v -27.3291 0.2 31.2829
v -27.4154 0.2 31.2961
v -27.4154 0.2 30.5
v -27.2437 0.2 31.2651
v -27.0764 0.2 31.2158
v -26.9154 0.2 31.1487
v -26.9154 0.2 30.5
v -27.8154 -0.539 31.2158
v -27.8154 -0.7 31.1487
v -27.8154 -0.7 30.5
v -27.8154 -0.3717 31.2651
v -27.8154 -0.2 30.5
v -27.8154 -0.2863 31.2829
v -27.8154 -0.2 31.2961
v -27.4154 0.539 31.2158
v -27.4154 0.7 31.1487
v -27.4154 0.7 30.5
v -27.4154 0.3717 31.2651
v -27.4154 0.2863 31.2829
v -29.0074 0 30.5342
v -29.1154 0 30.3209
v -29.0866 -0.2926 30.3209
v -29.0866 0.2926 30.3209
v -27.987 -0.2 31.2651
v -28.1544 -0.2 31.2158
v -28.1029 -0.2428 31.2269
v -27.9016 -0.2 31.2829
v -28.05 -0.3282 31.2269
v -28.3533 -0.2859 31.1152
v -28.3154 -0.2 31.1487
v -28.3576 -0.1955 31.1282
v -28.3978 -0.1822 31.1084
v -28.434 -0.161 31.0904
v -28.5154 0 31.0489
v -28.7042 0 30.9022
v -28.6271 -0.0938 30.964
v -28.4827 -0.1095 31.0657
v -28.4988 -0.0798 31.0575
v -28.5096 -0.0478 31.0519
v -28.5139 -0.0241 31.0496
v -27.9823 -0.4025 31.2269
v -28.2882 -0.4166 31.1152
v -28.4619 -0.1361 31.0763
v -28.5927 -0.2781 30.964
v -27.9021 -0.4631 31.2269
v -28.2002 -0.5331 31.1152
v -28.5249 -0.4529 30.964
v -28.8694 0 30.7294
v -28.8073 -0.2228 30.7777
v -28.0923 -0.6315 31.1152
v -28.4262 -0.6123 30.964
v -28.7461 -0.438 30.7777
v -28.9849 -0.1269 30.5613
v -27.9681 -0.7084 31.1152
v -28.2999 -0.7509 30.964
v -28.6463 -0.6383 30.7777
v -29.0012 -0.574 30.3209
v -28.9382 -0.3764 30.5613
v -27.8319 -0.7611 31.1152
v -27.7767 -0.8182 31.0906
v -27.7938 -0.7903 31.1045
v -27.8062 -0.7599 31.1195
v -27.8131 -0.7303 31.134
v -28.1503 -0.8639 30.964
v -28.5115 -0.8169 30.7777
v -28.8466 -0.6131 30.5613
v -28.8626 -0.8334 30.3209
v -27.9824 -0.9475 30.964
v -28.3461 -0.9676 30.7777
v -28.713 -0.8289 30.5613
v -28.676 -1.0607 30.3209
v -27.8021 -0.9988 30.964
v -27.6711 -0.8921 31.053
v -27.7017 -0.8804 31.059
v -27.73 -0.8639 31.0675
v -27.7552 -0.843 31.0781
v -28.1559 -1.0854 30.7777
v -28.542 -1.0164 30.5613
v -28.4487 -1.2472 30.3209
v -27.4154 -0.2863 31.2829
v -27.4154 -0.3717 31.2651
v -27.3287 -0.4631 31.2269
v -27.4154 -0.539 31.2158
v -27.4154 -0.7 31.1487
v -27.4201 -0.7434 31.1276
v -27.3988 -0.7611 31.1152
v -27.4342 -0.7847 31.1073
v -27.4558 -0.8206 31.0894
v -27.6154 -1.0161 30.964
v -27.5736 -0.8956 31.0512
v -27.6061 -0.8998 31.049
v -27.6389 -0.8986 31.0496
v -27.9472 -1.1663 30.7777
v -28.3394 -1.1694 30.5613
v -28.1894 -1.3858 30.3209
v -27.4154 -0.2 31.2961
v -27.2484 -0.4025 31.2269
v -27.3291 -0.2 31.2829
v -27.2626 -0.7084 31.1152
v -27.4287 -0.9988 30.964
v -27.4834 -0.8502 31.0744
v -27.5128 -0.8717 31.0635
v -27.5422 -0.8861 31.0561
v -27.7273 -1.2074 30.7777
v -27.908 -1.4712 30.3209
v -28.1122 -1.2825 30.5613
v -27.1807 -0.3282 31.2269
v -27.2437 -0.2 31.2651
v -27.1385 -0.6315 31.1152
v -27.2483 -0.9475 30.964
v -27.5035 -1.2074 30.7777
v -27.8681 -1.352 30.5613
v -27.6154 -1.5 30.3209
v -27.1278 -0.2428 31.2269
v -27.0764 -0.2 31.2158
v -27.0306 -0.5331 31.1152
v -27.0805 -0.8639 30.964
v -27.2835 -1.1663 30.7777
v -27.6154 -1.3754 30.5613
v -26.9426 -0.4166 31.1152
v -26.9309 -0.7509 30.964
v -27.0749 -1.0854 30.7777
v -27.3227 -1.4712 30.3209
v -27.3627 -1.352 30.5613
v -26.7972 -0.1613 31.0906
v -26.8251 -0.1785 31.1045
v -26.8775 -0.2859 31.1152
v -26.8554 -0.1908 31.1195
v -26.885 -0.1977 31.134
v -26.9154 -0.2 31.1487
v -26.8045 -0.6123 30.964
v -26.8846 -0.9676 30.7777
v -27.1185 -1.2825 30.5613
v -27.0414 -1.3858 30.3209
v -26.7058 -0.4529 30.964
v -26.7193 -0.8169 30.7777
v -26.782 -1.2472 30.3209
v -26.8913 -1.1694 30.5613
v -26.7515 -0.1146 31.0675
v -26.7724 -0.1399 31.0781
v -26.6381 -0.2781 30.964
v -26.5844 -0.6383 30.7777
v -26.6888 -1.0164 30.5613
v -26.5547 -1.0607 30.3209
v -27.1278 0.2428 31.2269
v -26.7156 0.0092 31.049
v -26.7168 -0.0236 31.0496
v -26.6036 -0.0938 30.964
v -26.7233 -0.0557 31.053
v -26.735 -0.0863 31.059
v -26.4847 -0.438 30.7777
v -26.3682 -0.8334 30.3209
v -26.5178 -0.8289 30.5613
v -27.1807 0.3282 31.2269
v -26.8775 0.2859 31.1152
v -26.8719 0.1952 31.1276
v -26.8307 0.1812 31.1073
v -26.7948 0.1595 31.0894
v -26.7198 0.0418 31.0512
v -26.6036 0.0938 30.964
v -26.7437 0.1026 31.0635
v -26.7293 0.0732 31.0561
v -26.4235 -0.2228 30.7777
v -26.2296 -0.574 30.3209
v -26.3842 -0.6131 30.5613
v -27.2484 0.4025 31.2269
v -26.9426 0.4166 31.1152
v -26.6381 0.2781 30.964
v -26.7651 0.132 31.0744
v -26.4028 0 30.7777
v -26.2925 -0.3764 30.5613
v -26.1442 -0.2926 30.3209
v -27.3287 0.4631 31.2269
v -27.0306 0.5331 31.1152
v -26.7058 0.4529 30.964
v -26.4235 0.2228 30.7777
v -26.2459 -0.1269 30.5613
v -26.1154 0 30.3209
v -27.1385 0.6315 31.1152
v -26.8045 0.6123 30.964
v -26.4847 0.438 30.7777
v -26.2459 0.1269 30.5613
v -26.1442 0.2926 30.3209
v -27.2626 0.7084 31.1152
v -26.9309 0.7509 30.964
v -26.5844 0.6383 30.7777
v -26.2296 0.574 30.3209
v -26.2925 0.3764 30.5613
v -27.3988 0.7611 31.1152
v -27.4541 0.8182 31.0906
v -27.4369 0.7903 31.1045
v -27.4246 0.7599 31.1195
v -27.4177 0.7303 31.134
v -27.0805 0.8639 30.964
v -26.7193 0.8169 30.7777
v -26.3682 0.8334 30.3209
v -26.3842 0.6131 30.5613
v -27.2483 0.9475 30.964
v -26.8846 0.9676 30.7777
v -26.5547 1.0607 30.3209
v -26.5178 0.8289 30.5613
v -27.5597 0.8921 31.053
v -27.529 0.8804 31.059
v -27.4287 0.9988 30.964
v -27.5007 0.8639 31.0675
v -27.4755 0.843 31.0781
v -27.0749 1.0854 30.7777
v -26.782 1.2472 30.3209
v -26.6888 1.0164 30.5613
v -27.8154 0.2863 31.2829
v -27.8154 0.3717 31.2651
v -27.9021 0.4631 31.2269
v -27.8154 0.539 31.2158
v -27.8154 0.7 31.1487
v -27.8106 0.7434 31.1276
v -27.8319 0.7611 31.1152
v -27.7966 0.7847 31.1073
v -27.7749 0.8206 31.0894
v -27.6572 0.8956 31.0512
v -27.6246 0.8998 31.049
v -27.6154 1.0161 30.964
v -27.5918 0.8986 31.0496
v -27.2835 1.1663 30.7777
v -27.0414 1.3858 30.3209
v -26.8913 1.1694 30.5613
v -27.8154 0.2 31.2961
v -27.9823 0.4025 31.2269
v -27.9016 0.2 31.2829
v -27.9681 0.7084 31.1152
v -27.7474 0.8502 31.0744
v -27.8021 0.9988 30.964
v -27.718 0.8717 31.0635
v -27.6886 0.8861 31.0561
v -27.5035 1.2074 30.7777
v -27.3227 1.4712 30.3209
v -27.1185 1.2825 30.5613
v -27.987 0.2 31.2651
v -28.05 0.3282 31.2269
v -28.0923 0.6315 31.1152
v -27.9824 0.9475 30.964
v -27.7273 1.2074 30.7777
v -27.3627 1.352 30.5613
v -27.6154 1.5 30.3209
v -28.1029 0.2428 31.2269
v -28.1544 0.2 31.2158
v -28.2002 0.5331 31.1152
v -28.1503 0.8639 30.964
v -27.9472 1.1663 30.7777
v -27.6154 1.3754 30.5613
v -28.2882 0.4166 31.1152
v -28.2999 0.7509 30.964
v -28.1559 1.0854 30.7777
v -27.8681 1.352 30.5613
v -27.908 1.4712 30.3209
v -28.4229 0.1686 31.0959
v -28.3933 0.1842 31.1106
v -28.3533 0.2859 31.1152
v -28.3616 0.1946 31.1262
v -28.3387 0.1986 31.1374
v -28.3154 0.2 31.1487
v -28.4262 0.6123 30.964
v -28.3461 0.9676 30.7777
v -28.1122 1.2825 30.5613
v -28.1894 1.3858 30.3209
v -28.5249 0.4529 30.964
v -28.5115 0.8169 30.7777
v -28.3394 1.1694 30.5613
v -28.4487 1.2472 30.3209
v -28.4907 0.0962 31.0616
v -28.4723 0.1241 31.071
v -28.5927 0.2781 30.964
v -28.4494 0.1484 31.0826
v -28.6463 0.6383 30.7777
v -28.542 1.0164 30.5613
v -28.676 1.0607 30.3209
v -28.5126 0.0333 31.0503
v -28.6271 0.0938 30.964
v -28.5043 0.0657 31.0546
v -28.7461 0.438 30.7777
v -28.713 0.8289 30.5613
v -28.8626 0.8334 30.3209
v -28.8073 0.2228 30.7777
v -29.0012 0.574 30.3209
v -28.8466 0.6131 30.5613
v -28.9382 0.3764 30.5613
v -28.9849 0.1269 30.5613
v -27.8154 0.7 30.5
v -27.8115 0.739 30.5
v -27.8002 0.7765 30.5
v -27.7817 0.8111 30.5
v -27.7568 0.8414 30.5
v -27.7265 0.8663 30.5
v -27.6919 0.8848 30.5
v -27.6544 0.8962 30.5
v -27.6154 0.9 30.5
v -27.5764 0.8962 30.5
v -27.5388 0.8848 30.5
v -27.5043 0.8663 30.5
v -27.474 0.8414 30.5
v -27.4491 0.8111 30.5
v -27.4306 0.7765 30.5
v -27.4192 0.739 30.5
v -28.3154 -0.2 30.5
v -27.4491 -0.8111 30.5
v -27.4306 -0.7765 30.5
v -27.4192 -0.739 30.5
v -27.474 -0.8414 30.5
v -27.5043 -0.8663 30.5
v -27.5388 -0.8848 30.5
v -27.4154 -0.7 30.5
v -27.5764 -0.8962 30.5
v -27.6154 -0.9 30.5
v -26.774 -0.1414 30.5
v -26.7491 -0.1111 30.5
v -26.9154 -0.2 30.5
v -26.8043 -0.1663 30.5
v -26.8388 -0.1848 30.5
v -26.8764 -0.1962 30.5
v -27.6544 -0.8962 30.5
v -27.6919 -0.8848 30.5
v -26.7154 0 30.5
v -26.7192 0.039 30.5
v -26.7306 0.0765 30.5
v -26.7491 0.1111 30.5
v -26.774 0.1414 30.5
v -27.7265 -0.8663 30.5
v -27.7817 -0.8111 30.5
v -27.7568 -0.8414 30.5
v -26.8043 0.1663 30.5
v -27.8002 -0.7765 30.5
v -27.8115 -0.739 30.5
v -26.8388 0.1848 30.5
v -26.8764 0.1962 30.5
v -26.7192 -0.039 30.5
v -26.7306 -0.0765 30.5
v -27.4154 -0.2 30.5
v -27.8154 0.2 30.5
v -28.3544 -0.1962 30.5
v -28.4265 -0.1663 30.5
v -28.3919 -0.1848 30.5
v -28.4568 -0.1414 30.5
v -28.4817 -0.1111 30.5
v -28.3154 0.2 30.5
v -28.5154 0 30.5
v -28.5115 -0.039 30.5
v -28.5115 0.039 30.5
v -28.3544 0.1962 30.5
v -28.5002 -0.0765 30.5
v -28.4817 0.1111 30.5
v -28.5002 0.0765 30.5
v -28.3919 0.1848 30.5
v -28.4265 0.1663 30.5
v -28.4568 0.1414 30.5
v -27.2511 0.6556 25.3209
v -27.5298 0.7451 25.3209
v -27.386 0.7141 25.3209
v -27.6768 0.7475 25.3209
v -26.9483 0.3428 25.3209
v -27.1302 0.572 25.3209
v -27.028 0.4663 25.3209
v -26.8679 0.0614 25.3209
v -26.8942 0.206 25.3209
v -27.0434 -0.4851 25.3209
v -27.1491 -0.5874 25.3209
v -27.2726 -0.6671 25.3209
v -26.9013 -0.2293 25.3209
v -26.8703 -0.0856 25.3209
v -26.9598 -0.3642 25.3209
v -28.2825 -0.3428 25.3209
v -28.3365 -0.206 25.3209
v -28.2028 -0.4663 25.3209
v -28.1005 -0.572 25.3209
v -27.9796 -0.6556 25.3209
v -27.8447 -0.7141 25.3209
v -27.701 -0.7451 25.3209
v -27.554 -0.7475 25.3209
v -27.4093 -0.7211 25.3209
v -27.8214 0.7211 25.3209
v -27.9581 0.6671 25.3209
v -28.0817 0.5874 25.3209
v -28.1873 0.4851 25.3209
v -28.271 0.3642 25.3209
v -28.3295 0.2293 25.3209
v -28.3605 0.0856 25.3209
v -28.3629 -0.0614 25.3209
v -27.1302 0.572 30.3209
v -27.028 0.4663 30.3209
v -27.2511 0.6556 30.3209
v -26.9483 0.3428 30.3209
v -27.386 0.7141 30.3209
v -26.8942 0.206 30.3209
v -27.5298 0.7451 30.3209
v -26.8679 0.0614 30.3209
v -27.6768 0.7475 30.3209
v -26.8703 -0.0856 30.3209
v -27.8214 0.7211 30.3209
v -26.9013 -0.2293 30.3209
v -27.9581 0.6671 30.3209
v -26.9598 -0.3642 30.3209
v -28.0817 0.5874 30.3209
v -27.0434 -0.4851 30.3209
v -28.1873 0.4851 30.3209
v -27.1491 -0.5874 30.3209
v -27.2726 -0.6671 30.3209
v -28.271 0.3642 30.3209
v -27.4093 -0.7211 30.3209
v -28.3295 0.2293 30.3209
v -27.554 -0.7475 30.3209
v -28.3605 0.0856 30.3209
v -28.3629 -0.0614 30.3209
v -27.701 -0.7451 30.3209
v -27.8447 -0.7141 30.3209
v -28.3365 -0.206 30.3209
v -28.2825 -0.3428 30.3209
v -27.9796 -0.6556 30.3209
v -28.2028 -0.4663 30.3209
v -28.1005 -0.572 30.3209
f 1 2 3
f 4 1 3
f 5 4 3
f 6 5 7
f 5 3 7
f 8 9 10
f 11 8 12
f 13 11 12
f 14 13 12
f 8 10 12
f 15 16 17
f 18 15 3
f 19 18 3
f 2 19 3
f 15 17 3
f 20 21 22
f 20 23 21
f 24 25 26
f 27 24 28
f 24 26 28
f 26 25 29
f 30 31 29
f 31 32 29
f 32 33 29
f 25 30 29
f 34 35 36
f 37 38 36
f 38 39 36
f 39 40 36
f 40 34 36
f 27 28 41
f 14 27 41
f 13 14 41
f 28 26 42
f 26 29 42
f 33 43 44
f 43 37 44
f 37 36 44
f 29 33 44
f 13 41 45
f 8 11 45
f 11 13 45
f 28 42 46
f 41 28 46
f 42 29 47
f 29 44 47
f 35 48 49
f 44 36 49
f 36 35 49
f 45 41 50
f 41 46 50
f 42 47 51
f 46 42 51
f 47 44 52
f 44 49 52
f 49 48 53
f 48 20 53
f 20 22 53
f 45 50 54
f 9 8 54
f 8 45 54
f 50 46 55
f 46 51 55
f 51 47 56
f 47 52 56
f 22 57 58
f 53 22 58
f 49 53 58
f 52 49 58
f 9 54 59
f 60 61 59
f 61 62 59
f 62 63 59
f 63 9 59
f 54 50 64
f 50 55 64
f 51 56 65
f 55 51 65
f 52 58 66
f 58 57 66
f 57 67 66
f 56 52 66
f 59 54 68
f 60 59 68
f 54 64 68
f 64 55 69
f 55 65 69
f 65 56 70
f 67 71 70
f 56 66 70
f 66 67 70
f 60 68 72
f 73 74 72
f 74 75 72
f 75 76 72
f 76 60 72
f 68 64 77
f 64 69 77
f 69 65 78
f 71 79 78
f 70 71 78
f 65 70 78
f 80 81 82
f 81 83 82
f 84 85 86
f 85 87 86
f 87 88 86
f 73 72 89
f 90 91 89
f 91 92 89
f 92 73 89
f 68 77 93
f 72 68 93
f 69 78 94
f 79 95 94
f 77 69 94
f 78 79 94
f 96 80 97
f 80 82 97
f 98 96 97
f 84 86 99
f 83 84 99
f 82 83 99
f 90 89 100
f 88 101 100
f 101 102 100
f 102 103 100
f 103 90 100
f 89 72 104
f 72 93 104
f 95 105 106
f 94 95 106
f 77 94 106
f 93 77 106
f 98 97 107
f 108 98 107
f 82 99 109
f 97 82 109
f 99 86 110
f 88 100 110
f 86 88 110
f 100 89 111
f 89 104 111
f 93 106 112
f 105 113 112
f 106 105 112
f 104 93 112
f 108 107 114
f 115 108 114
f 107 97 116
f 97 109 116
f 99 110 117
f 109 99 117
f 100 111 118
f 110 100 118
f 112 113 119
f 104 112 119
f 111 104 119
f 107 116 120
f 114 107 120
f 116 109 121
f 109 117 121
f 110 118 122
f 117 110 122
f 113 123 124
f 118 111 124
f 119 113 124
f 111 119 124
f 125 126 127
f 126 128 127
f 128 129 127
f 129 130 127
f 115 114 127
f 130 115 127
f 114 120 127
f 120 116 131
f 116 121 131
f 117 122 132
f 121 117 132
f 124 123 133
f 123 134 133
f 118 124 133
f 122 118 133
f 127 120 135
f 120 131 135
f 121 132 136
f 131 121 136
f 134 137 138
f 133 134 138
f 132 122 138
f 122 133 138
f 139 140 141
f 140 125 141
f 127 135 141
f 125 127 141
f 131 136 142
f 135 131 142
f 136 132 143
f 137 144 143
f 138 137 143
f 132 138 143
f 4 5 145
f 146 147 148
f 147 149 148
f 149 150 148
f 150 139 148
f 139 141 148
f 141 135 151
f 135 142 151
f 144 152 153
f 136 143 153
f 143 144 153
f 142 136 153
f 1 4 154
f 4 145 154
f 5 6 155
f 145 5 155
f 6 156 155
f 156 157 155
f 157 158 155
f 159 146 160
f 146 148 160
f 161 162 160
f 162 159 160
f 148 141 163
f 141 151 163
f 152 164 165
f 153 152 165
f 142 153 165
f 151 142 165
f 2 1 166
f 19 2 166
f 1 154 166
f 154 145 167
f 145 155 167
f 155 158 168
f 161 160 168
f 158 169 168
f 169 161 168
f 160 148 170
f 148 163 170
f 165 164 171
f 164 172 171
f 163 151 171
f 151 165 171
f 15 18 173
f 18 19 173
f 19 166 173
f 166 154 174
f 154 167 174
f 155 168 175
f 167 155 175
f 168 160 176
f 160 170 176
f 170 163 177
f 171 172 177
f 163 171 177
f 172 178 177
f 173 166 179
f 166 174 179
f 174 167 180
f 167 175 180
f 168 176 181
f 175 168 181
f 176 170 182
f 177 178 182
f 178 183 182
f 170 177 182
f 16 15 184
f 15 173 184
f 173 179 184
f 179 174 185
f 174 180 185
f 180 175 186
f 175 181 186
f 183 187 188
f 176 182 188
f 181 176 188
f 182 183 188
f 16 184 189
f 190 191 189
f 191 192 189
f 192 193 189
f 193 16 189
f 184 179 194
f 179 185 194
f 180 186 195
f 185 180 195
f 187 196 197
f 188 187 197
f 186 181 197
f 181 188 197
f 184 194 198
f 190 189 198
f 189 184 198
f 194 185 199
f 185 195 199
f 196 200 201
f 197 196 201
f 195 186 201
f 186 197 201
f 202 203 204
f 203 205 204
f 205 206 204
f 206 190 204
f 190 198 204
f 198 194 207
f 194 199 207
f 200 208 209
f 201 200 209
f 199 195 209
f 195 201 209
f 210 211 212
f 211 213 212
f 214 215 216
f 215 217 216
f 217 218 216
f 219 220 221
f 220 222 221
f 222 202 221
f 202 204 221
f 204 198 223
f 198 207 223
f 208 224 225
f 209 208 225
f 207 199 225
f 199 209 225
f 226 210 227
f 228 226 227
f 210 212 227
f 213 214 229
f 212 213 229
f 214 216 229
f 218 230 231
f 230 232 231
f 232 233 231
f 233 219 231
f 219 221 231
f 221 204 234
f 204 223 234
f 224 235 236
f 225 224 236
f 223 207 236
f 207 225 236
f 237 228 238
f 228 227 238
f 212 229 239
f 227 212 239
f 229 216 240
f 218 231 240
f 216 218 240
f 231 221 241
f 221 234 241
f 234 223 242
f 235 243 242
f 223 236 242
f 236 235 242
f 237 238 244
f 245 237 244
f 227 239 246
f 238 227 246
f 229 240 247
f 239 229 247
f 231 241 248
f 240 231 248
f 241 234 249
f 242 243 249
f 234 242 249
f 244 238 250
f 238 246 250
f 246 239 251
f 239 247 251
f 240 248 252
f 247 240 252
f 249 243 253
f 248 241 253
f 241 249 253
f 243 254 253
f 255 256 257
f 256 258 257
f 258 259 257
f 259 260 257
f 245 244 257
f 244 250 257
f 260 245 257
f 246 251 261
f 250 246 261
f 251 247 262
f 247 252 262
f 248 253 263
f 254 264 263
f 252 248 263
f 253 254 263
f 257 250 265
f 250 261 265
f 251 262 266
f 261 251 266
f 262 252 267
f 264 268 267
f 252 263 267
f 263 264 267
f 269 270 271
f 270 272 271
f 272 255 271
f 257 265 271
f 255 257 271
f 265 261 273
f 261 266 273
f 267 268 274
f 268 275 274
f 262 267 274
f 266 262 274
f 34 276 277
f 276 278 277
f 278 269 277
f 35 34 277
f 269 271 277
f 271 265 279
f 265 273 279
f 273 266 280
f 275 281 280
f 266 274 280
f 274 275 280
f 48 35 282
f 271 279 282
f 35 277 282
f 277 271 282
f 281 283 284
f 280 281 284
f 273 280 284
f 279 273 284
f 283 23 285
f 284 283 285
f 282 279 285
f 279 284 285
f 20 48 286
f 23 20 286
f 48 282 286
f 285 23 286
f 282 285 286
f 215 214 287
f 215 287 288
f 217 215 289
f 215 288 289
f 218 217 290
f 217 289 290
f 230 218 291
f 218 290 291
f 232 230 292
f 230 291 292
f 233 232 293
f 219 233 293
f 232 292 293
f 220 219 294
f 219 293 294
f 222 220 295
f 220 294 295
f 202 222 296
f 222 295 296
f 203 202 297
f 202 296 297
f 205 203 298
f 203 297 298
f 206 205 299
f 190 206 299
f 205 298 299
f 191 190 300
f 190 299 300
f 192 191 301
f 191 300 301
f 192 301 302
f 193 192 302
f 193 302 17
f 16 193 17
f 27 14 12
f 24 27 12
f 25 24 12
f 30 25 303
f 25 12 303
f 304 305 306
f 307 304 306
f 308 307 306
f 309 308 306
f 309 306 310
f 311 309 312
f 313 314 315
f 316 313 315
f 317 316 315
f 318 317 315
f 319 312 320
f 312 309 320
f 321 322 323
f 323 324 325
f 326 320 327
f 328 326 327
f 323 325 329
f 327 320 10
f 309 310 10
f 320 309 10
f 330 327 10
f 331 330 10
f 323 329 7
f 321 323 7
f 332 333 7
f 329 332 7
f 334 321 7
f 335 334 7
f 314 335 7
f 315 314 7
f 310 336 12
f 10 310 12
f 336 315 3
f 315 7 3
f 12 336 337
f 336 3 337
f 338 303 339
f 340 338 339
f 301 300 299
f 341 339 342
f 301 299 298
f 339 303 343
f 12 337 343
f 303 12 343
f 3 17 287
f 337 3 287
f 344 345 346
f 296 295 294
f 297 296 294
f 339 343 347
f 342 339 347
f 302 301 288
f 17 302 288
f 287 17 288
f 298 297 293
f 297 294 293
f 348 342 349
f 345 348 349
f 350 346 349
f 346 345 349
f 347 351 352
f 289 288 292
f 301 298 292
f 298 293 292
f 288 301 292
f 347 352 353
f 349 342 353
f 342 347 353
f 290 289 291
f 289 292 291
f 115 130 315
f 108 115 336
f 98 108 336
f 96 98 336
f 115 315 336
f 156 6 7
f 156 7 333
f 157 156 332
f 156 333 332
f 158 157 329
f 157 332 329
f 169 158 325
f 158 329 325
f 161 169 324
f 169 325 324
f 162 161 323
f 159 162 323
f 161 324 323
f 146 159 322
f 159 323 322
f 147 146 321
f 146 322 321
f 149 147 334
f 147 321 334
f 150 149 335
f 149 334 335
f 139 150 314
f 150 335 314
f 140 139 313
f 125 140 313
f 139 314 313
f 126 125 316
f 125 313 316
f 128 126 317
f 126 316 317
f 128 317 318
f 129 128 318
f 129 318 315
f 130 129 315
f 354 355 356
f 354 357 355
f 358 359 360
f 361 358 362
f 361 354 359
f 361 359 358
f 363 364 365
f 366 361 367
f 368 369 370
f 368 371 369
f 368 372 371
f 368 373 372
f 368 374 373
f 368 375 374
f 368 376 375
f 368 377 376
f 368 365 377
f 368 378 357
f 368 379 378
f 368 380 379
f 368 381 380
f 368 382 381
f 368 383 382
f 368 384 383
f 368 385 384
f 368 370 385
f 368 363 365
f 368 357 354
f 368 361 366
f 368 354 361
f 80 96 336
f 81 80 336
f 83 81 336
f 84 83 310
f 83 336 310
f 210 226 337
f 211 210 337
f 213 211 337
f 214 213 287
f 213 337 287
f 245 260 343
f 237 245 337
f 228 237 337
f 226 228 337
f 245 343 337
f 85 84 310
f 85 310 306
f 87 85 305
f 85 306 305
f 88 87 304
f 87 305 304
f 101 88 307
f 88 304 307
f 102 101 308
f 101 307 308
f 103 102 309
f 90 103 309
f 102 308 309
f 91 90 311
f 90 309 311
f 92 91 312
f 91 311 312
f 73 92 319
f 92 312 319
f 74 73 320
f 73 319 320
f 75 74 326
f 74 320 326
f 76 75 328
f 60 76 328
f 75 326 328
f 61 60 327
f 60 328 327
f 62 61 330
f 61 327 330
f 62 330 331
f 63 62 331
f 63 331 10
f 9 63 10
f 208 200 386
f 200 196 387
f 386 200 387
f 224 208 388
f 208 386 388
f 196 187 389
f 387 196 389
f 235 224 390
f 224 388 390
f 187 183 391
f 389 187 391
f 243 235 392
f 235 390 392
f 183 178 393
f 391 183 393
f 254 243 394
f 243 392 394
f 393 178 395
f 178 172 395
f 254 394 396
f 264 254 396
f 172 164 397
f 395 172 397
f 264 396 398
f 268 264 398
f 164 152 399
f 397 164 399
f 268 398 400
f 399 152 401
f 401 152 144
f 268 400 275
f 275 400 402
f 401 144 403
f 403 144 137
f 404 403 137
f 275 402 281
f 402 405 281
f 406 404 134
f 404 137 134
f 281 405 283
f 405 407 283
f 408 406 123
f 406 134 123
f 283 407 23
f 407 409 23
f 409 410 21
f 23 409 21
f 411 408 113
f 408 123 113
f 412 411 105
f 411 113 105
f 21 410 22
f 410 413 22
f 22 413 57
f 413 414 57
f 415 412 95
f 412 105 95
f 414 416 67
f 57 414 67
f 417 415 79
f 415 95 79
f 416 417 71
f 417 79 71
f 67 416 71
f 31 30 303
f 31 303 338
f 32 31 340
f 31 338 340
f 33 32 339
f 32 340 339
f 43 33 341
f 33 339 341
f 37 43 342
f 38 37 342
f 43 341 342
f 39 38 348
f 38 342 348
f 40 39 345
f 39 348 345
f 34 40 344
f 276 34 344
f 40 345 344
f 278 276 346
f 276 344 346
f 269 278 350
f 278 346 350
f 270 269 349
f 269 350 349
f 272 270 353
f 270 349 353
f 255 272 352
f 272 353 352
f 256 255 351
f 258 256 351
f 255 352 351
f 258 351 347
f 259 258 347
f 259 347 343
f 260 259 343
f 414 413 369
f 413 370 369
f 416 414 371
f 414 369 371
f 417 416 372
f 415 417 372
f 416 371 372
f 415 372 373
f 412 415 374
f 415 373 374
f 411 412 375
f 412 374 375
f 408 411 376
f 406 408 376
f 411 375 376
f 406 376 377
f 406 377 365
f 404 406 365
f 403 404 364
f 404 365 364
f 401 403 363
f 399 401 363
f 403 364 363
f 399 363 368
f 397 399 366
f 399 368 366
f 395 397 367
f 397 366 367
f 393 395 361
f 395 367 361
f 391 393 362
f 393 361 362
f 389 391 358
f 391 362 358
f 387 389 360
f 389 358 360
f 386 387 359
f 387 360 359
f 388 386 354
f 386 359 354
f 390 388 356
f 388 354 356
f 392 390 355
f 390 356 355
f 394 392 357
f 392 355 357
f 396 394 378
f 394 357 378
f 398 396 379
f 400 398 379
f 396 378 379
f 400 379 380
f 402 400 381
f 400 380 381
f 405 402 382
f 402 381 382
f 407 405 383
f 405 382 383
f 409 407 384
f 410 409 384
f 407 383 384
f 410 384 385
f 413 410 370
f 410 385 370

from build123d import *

# Parameters (mm, degrees)
ENL_V_MAT_EXTRU_1_REACH      = 31.166
ENL_V_MAT_EXTRU_1_END_RADIUS = 1.625
ESQUISSE3_W                  = 0.75
ESQUISSE3_H                  = 5


with BuildPart() as part:
    # Esquisse1 → Révolution1 (revolve)
    with BuildSketch(Plane(origin=(0, 0, 0), x_dir=(1, 0, 0), z_dir=(0, 1, 0)), mode=Mode.PRIVATE) as r_volution1_sk:
        with BuildLine():
            Line((-26.1153768, -30.3208848), (-27.6153768, -30.3208848))
            Line((-27.6153768, -30.3208848), (-27.6153768, -31.3208848))
            ThreePointArc((-27.6153768, -31.3208848), (-26.713988981, -31.047966528), (-26.1153768, -30.3208848))
        make_face()
    revolve(r_volution1_sk.sketch.rotate(Axis((-27.6153768, 0, 30.3208848), (0, 0, 1)), 180), axis=Axis((-27.6153768, 0, 30.3208848), (0, 0, 1)))

    # Enlèv. mat.-Extru.1: up to this sphere (the profile starts inside it)
    enl_v_mat_extru_1_end = Location((-27.6153768, 0, 29.6958848)) * Sphere(ENL_V_MAT_EXTRU_1_END_RADIUS, mode=Mode.PRIVATE)
    # Esquisse2 → Enlèv. mat.-Extru.1 (cut, up to the surface)
    with BuildSketch(Plane(origin=(0, 0, 30.5), x_dir=(-1, 0, 0), z_dir=(0, 0, -1)), mode=Mode.PRIVATE) as enl_v_mat_extru_1_sk1:
        with BuildLine():
            Line((27.8153768, 0.2), (27.8153768, 0.7))
            ThreePointArc((27.8153768, 0.7), (27.6153768, 0.9), (27.4153768, 0.7))
            Line((27.4153768, 0.7), (27.4153768, 0.2))
            Line((27.4153768, 0.2), (26.9153768, 0.2))
            ThreePointArc((26.9153768, 0.2), (26.7153768, 0), (26.9153768, -0.2))
            Line((26.9153768, -0.2), (27.4153768, -0.2))
            Line((27.4153768, -0.2), (27.4153768, -0.7))
            ThreePointArc((27.4153768, -0.7), (27.6153768, -0.9), (27.8153768, -0.7))
            Line((27.8153768, -0.7), (27.8153768, -0.2))
            Line((27.8153768, -0.2), (28.3153768, -0.2))
            ThreePointArc((28.3153768, -0.2), (28.5153768, 0), (28.3153768, 0.2))
            Line((28.3153768, 0.2), (27.8153768, 0.2))
        make_face()
    enl_v_mat_extru_1_tool1 = extrude(enl_v_mat_extru_1_sk1.sketch, amount=-ENL_V_MAT_EXTRU_1_REACH, mode=Mode.PRIVATE) & enl_v_mat_extru_1_end
    add(enl_v_mat_extru_1_tool1.solids().sort_by_distance((-27.615377, 0, 30.5))[0], mode=Mode.SUBTRACT)

    # Esquisse3 → Révolution2 (revolve)
    with BuildSketch(Plane(origin=(0, 0, 0), x_dir=(1, 0, 0), z_dir=(0, 1, 0)), mode=Mode.PRIVATE) as r_volution2_sk:
        with Locations((-27.2403768, -27.8208848)):
            Rectangle(ESQUISSE3_W, ESQUISSE3_H)
    revolve(r_volution2_sk.sketch.rotate(Axis((-27.6153768, 0, 25.3208848), (0, 0, 1)), 195.945395901), axis=Axis((-27.6153768, 0, 25.3208848), (0, 0, 1)))


solid = part.part
